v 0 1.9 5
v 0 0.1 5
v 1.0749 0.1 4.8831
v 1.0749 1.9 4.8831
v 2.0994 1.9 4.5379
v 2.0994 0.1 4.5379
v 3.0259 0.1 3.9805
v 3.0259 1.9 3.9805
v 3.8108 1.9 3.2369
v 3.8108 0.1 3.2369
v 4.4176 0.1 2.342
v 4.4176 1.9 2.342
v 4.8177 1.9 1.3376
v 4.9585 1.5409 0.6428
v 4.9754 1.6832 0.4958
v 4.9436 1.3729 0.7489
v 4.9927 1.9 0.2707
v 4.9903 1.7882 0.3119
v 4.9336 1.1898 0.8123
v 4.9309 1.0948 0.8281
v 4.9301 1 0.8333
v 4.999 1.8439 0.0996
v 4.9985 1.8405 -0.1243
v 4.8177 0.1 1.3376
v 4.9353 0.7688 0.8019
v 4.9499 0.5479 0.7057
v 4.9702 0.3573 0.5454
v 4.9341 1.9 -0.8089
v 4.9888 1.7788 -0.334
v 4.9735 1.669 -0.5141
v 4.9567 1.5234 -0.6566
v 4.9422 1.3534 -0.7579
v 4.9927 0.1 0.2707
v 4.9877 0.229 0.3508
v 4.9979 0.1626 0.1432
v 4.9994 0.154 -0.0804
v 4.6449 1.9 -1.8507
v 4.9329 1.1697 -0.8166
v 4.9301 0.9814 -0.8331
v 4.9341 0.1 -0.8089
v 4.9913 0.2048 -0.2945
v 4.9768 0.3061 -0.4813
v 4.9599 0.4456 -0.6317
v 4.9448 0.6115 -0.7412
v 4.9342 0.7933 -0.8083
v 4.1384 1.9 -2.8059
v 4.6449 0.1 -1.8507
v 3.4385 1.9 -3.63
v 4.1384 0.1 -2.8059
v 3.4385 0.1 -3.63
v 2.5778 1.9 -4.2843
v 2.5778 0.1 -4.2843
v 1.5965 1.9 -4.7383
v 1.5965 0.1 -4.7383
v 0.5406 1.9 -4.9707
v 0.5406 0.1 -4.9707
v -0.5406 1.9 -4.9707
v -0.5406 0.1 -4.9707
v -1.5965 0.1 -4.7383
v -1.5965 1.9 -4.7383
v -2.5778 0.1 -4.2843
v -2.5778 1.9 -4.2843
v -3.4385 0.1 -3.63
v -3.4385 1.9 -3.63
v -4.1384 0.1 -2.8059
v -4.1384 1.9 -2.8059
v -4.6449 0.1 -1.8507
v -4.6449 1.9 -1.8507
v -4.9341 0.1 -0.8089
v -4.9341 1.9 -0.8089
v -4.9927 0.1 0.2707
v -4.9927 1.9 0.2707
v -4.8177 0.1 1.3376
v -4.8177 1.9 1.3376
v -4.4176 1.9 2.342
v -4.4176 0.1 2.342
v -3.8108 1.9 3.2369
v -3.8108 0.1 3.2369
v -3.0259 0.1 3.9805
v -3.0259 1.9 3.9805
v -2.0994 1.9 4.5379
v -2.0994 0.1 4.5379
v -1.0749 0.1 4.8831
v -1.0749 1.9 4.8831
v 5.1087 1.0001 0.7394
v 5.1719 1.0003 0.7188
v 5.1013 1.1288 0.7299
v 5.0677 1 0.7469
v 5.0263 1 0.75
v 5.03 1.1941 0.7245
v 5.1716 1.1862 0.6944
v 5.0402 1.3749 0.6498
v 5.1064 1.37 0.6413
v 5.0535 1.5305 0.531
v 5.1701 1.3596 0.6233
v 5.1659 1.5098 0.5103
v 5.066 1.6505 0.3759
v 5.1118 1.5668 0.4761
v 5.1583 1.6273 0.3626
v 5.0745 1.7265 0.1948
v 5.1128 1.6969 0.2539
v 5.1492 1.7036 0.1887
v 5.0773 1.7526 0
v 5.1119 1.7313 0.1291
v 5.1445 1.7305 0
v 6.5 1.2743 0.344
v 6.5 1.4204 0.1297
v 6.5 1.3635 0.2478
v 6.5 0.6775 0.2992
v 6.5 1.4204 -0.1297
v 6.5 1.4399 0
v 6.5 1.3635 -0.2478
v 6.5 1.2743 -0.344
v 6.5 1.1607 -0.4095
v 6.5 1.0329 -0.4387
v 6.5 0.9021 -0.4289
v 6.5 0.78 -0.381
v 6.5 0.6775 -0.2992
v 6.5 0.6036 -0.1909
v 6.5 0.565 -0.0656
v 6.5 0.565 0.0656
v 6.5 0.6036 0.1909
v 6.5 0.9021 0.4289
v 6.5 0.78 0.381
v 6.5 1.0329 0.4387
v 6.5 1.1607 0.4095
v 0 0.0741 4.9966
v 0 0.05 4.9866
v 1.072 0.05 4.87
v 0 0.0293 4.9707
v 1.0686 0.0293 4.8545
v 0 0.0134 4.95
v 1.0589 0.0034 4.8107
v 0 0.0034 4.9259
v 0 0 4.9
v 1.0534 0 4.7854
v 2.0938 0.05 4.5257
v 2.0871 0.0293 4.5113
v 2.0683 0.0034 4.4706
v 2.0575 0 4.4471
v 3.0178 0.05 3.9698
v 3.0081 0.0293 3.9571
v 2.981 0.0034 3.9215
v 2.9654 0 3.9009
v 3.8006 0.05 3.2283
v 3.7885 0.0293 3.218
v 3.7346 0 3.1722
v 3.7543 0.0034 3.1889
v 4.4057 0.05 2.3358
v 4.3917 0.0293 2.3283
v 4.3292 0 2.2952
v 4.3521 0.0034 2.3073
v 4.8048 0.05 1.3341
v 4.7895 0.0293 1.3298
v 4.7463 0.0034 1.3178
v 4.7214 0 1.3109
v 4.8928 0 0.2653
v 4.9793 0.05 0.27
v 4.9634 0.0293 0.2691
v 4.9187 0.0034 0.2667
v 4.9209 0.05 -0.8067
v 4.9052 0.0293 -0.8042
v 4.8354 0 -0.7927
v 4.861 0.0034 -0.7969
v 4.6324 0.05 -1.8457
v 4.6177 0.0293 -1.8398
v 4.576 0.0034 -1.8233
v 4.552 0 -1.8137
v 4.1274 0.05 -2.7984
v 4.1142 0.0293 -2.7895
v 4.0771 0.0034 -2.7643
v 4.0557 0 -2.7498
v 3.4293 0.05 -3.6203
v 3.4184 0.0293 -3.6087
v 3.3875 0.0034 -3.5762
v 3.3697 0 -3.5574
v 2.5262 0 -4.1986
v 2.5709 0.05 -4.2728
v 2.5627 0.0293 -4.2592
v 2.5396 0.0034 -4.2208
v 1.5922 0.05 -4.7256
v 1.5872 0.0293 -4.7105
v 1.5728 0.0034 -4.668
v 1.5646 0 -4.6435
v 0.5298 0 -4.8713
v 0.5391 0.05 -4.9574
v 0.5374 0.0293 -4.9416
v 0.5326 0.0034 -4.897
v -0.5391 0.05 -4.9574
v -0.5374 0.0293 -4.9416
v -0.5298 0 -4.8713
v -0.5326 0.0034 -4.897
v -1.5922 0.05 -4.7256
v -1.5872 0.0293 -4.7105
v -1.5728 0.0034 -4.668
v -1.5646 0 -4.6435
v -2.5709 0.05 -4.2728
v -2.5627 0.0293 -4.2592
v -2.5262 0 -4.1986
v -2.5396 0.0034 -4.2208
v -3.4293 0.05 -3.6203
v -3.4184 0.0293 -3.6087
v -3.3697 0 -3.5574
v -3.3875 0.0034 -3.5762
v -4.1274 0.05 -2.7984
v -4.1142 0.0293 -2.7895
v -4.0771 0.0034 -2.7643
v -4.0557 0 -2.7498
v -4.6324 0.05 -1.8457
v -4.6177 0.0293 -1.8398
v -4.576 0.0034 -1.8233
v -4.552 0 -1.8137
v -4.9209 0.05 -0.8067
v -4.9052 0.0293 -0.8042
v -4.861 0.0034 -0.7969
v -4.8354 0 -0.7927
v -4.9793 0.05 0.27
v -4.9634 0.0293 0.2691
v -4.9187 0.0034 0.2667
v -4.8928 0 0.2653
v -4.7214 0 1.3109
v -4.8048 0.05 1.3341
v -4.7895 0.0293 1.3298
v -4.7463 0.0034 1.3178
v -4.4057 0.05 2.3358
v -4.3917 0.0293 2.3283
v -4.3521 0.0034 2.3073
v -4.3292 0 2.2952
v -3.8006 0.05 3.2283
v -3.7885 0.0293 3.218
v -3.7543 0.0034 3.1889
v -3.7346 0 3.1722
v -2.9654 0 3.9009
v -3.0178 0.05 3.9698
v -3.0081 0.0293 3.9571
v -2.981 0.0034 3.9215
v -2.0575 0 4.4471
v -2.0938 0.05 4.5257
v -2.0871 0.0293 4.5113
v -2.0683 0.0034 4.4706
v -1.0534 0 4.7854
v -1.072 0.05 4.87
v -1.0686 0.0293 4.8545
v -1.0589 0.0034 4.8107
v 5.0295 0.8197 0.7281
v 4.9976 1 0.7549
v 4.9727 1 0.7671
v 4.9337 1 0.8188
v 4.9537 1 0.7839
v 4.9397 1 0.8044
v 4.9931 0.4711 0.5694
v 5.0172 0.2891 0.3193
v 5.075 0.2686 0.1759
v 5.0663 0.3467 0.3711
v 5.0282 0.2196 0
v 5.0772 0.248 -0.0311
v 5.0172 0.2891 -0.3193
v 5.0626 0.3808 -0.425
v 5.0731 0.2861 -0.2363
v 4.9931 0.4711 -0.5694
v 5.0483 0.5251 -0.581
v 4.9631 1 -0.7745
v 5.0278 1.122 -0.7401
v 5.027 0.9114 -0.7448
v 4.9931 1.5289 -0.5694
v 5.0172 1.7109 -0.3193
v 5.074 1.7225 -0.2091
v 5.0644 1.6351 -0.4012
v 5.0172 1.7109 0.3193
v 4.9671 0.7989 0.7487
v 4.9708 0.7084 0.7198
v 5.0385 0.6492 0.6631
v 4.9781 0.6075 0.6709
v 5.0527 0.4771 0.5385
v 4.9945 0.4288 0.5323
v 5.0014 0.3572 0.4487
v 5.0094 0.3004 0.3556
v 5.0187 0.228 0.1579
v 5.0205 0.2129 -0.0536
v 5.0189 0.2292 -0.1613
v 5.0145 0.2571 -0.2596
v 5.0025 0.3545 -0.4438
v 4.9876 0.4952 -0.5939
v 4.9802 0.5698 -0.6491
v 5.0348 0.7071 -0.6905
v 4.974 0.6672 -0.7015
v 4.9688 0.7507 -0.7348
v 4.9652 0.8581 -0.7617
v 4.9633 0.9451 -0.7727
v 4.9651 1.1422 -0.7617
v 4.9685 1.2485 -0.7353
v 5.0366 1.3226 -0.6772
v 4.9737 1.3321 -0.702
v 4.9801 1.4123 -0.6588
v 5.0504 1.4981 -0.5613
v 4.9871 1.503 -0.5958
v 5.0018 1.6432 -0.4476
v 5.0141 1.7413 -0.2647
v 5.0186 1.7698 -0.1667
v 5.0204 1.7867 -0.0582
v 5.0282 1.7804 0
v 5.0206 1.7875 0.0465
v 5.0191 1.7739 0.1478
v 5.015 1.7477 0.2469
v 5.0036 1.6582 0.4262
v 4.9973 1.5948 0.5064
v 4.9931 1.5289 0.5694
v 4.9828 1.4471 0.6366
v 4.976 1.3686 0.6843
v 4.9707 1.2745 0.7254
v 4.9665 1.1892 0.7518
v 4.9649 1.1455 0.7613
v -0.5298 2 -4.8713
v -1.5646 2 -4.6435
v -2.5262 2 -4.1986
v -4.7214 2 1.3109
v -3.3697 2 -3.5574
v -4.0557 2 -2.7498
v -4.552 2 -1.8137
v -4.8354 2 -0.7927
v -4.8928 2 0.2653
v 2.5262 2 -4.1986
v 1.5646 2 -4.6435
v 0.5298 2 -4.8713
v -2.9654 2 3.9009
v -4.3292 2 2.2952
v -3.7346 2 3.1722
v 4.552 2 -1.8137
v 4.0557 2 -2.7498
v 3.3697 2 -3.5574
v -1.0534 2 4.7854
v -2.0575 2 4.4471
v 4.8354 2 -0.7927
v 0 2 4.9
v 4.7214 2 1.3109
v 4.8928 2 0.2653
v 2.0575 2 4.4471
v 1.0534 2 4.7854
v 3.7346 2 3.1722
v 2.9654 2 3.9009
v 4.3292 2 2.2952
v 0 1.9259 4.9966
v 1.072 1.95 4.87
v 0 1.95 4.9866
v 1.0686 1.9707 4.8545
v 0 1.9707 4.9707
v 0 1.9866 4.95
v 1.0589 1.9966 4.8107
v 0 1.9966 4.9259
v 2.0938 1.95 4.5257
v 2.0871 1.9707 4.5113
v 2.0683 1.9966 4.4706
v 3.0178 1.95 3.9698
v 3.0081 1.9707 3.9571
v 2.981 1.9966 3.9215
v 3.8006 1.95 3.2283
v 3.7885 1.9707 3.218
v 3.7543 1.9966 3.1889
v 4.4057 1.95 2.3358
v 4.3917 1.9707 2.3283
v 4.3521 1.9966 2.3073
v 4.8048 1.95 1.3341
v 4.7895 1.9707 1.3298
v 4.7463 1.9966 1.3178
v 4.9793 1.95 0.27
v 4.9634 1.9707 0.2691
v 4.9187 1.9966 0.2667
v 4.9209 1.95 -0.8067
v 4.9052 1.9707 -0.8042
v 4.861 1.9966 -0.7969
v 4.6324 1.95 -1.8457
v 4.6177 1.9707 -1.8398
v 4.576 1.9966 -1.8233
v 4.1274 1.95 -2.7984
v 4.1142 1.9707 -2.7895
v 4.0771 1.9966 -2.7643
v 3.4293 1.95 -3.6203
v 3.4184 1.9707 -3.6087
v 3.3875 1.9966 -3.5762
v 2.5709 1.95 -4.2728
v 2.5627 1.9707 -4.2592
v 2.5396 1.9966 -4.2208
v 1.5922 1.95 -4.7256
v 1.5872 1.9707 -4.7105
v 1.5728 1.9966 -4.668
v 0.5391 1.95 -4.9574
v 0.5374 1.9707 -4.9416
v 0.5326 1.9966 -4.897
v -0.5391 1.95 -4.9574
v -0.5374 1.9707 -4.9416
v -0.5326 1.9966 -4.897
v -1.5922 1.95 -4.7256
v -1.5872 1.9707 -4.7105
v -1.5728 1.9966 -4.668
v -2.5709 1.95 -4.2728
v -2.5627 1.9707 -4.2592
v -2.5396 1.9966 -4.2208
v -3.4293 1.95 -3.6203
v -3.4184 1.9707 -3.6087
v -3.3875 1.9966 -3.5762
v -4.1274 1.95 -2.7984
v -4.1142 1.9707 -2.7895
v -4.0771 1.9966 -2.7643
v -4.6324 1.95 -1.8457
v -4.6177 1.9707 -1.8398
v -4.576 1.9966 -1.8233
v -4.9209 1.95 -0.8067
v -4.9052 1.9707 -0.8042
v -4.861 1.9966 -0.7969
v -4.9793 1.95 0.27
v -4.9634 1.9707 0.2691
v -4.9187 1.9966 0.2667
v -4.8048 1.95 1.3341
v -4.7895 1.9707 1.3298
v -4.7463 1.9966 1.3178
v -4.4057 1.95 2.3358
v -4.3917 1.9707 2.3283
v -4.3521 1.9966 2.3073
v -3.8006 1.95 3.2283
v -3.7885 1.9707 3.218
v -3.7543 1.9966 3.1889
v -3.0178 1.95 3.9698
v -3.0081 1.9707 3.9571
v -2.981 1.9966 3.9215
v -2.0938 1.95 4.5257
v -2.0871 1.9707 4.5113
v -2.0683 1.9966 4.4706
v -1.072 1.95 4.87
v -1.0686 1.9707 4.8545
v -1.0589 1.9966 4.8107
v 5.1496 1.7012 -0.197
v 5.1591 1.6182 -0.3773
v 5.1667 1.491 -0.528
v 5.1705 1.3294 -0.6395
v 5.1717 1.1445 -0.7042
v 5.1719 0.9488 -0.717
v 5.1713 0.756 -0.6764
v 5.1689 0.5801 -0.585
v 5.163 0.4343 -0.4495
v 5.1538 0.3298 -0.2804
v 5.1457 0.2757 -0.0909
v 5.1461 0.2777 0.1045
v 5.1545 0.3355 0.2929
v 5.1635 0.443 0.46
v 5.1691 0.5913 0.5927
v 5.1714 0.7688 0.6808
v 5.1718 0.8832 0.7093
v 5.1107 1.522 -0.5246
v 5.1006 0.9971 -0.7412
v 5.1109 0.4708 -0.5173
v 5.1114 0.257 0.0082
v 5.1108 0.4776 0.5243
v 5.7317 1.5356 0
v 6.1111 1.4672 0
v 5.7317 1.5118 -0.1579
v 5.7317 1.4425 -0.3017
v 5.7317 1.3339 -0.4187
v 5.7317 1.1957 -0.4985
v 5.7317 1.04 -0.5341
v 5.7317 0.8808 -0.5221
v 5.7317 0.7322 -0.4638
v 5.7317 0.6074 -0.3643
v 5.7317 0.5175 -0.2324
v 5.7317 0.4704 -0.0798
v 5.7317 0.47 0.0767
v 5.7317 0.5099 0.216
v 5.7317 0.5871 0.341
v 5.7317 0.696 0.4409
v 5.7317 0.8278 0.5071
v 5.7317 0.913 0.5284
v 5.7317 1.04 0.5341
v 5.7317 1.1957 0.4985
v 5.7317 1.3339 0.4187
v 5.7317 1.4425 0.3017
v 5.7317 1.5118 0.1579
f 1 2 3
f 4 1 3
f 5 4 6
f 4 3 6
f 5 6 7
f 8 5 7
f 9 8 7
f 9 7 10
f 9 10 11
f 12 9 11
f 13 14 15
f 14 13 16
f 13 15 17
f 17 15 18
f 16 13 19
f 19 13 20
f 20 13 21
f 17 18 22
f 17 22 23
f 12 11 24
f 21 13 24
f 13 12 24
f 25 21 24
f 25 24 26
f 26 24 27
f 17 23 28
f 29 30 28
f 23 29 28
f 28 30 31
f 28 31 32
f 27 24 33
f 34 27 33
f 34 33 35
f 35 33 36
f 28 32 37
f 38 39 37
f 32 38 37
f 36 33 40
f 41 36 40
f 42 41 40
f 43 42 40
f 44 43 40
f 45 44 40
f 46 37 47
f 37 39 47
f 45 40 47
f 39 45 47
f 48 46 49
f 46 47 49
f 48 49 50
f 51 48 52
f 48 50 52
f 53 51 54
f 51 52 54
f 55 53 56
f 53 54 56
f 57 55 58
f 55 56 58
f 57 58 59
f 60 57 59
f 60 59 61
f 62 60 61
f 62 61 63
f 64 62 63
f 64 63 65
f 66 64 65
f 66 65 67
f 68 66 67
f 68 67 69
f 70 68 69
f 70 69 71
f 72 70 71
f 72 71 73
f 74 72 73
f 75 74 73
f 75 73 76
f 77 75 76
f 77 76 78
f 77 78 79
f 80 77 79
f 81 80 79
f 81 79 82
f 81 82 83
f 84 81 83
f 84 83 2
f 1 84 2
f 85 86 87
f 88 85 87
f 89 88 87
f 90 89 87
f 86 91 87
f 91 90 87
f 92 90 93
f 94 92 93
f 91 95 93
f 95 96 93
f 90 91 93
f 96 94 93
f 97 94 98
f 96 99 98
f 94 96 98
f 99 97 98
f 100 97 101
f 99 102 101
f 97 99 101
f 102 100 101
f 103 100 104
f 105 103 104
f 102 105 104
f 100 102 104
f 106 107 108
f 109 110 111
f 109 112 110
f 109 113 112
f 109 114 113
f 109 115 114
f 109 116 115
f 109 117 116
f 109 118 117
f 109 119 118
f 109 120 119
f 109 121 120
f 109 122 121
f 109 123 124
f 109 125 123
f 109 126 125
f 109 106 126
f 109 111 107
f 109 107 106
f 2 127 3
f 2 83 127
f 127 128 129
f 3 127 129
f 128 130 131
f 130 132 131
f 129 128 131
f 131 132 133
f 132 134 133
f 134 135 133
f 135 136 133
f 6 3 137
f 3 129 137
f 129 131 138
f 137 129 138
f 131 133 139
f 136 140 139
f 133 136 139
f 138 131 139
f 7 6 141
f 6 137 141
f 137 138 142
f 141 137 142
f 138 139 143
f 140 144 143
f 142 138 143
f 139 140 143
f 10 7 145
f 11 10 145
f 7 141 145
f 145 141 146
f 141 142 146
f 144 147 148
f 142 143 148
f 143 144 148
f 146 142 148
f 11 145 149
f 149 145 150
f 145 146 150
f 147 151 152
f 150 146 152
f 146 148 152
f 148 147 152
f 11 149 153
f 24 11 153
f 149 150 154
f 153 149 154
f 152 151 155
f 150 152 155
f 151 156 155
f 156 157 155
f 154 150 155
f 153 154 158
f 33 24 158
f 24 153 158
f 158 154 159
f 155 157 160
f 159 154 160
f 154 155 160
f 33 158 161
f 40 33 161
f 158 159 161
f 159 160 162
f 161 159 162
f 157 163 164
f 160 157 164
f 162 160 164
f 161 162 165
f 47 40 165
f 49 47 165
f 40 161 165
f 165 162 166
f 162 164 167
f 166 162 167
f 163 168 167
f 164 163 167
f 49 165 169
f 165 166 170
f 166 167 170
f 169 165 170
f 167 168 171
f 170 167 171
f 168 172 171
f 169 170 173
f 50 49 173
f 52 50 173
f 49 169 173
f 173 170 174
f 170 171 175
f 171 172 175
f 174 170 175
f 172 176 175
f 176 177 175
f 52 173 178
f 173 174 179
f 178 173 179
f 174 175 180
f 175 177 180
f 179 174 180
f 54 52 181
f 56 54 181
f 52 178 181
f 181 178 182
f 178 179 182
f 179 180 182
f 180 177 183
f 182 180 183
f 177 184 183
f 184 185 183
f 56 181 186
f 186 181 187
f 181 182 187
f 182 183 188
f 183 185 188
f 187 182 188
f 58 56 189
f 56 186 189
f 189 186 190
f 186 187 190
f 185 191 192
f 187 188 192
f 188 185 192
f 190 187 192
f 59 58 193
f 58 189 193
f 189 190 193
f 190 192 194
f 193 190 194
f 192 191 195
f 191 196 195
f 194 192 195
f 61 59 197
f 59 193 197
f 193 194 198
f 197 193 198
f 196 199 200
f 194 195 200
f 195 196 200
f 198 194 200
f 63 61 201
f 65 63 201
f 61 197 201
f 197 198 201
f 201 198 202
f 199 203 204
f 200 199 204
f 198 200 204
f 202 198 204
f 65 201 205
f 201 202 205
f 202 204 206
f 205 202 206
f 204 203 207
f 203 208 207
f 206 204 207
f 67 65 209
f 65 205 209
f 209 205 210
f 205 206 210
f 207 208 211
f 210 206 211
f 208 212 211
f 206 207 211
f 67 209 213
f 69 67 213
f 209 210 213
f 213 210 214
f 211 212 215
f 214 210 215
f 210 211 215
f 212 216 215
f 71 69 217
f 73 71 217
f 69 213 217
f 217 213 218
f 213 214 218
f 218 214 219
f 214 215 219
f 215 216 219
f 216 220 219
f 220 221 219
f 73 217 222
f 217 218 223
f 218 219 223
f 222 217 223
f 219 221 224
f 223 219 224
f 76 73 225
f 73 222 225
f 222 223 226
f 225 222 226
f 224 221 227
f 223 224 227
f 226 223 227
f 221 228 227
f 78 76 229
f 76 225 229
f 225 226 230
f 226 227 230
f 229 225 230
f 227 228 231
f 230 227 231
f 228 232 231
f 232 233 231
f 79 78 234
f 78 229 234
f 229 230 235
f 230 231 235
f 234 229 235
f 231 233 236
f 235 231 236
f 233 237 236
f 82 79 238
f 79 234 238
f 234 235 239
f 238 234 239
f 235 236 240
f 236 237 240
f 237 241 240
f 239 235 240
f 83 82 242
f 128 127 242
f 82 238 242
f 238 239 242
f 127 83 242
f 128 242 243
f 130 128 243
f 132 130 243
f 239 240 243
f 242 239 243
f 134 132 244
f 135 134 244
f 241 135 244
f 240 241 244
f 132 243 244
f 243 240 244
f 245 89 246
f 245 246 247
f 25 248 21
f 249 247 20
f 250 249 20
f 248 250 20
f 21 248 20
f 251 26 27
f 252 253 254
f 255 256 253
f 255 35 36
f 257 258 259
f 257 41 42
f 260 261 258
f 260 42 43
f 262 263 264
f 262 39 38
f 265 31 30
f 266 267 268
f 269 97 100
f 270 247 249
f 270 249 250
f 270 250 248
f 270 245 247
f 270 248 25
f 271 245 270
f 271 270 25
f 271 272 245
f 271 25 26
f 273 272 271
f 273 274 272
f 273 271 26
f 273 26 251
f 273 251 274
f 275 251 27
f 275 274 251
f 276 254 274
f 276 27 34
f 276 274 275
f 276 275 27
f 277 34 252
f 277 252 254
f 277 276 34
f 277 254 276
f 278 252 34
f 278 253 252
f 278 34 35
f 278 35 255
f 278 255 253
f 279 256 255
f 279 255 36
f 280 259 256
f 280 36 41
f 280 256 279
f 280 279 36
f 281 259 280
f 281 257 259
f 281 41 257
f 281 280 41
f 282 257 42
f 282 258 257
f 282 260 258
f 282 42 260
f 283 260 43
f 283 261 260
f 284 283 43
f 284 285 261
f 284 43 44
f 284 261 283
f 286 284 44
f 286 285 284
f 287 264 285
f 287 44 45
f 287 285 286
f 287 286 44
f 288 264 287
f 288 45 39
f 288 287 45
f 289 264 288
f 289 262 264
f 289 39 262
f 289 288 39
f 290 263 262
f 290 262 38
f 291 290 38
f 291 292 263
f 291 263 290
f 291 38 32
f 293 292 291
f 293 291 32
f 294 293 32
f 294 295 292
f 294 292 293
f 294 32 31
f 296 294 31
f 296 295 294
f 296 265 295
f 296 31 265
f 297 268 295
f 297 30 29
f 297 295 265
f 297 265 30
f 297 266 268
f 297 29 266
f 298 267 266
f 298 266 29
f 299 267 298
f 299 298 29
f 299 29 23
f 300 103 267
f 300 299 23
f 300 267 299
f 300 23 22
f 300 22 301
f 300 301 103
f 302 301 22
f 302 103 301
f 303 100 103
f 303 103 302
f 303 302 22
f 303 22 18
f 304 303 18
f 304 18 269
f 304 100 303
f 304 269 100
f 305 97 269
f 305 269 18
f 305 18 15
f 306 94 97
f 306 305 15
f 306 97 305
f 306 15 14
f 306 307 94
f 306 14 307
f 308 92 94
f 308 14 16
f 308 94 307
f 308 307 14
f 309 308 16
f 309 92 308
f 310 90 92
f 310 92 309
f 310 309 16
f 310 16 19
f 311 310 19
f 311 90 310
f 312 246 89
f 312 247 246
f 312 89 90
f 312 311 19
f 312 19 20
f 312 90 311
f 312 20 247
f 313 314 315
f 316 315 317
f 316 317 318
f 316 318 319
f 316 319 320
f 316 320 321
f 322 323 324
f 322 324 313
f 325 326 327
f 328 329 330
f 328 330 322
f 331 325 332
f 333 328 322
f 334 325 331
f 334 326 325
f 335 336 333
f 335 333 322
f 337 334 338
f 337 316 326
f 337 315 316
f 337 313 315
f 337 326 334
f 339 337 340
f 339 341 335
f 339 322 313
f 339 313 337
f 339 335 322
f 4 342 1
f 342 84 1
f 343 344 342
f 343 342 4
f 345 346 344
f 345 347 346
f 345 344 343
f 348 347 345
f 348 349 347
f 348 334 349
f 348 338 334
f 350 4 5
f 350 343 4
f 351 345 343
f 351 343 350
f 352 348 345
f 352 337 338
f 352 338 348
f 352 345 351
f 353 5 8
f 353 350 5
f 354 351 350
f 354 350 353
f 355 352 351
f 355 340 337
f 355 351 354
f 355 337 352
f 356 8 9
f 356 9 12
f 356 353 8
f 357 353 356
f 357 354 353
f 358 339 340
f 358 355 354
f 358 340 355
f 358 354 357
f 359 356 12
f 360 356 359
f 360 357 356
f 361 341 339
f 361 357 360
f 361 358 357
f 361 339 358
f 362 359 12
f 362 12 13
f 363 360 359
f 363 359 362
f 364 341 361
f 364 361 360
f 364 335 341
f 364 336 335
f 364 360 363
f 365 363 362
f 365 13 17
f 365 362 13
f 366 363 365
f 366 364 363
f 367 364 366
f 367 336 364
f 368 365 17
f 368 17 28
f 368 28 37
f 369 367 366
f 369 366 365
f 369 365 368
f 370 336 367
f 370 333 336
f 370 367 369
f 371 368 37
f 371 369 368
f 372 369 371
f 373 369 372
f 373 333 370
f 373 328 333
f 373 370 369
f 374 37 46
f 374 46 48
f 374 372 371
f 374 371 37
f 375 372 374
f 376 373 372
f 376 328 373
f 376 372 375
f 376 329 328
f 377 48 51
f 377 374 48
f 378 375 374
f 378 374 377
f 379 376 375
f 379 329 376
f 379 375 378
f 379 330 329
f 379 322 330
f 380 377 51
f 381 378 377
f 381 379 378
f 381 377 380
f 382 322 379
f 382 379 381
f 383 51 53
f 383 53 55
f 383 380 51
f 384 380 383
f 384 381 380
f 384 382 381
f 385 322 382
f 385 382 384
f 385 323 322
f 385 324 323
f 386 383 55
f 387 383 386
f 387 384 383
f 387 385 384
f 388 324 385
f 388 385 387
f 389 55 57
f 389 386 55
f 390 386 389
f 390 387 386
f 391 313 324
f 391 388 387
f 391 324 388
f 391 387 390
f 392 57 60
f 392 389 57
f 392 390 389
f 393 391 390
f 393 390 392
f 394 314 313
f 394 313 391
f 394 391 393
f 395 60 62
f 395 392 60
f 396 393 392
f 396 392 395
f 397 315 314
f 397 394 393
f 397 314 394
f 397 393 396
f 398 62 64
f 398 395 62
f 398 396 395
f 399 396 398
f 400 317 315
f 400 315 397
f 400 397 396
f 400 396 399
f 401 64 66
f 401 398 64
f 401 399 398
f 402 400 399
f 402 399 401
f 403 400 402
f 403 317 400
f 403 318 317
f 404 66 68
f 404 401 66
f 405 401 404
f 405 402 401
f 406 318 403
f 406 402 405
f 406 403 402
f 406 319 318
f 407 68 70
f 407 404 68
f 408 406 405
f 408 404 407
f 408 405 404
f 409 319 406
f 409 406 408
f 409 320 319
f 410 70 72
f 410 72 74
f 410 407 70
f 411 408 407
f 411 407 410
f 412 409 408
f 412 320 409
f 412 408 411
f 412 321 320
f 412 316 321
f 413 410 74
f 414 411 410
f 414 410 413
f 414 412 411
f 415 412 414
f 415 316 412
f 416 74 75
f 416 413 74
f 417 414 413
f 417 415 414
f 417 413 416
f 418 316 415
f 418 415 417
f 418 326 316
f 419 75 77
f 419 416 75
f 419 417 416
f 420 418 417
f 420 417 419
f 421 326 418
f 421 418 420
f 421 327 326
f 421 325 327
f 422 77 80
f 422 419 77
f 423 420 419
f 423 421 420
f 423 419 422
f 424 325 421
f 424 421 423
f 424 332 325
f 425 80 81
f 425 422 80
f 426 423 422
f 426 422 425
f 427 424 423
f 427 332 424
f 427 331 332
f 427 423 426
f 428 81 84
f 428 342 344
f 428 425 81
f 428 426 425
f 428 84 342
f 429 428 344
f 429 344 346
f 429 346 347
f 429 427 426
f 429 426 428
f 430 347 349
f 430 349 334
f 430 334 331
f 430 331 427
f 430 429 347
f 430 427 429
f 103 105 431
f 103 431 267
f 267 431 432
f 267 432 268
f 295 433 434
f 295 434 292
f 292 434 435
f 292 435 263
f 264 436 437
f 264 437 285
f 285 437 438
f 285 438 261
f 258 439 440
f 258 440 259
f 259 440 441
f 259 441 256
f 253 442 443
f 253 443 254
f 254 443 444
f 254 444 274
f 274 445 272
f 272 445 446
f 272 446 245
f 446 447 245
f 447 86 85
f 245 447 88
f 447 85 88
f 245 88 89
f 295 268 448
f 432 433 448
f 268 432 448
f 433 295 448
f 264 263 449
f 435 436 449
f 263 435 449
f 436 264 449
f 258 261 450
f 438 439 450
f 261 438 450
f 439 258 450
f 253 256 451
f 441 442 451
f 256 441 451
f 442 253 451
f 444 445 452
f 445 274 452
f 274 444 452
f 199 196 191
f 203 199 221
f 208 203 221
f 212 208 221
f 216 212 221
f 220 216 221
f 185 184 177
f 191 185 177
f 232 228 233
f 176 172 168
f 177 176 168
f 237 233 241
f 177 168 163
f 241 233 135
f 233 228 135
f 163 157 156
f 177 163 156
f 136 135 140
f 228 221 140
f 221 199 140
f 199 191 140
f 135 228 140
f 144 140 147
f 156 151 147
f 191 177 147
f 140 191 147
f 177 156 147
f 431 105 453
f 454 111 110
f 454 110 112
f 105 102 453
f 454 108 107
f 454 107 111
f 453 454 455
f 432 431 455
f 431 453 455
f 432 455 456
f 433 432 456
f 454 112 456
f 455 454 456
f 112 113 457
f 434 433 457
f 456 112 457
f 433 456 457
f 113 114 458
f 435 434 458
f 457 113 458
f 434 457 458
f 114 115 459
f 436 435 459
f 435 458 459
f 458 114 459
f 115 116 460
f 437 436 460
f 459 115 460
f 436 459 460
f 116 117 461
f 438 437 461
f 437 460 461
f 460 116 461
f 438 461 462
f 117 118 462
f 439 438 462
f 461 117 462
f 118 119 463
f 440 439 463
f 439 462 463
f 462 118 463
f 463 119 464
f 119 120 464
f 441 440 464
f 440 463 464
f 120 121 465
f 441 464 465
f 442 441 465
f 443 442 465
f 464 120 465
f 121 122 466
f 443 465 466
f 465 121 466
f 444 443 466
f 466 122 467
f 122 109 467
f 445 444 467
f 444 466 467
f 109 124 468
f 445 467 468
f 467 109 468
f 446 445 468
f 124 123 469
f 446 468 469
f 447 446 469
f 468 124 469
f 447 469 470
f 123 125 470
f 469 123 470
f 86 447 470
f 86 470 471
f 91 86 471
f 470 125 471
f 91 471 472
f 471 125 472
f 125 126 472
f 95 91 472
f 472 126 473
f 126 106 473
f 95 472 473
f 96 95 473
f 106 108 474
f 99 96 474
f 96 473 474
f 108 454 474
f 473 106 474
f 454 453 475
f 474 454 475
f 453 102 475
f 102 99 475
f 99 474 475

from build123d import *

# Parameters (mm, degrees)
SKETCH1_R           = 5
BOSS_EXTRUDE1_DEPTH = 2
SKETCH2_R           = 0.75
BOSS_EXTRUDE2_DEPTH = 6.5
FILLET2_R           = 0.1
FILLET3_R           = 0.4


with BuildPart() as part:
    # Sketch1 → Boss-Extrude1 (new body)
    with BuildSketch(Plane(origin=(0, 0, 0), x_dir=(1, 0, 0), z_dir=(0, 1, 0))):
        with Locations(Location((0, 0, 0), (0, 0, 270))):
            Circle(SKETCH1_R)
    extrude(amount=BOSS_EXTRUDE1_DEPTH)

    # Sketch2 → Boss-Extrude2 (add)
    with BuildSketch(Plane(origin=(0, 0, 0), x_dir=(0, 0, -1), z_dir=(1, 0, 0))):
        with Locations(Location((0, 1, 0), (0, 0, 180))):
            Circle(SKETCH2_R)
    extrude(amount=BOSS_EXTRUDE2_DEPTH)

    # Fillet2
    fillet2_edges = [part.edges().sort_by_distance(p)[0] for p in [
        (0, 0, -5),
        (0, 2, -5),
        (4.943429983, 1, -0.75),
    ]]
    fillet(fillet2_edges, radius=FILLET2_R)

    # Sketch3 → Cut-Revolve1 (revolve, cut)
    with BuildSketch(Plane.XY):
        with BuildLine():
            Line((5.099991295, 1.75), (6.5, 1.75))
            Line((6.5, 1.75), (6.5, 1.439938519))
            add(Edge.make_bspline(
                [(5.099991295, 1.75), (5.766866466, 1.452391497), (6.5, 1.439938519)],
                knots=[0, 0, 0, 1, 1, 1], degree=2))
        make_face()
    revolve(axis=Axis((6.5, 1, 0), (-1, 0, 0)), mode=Mode.SUBTRACT)

    # Fillet3
    fillet3_edges = [part.edges().sort_by_distance(p)[0] for p in [
        (5.099991295, 0.995851942, -0.749988529),
        (5.099991295, 1.004148058, 0.749988529),
    ]]
    fillet(fillet3_edges, radius=FILLET3_R)


solid = part.part
